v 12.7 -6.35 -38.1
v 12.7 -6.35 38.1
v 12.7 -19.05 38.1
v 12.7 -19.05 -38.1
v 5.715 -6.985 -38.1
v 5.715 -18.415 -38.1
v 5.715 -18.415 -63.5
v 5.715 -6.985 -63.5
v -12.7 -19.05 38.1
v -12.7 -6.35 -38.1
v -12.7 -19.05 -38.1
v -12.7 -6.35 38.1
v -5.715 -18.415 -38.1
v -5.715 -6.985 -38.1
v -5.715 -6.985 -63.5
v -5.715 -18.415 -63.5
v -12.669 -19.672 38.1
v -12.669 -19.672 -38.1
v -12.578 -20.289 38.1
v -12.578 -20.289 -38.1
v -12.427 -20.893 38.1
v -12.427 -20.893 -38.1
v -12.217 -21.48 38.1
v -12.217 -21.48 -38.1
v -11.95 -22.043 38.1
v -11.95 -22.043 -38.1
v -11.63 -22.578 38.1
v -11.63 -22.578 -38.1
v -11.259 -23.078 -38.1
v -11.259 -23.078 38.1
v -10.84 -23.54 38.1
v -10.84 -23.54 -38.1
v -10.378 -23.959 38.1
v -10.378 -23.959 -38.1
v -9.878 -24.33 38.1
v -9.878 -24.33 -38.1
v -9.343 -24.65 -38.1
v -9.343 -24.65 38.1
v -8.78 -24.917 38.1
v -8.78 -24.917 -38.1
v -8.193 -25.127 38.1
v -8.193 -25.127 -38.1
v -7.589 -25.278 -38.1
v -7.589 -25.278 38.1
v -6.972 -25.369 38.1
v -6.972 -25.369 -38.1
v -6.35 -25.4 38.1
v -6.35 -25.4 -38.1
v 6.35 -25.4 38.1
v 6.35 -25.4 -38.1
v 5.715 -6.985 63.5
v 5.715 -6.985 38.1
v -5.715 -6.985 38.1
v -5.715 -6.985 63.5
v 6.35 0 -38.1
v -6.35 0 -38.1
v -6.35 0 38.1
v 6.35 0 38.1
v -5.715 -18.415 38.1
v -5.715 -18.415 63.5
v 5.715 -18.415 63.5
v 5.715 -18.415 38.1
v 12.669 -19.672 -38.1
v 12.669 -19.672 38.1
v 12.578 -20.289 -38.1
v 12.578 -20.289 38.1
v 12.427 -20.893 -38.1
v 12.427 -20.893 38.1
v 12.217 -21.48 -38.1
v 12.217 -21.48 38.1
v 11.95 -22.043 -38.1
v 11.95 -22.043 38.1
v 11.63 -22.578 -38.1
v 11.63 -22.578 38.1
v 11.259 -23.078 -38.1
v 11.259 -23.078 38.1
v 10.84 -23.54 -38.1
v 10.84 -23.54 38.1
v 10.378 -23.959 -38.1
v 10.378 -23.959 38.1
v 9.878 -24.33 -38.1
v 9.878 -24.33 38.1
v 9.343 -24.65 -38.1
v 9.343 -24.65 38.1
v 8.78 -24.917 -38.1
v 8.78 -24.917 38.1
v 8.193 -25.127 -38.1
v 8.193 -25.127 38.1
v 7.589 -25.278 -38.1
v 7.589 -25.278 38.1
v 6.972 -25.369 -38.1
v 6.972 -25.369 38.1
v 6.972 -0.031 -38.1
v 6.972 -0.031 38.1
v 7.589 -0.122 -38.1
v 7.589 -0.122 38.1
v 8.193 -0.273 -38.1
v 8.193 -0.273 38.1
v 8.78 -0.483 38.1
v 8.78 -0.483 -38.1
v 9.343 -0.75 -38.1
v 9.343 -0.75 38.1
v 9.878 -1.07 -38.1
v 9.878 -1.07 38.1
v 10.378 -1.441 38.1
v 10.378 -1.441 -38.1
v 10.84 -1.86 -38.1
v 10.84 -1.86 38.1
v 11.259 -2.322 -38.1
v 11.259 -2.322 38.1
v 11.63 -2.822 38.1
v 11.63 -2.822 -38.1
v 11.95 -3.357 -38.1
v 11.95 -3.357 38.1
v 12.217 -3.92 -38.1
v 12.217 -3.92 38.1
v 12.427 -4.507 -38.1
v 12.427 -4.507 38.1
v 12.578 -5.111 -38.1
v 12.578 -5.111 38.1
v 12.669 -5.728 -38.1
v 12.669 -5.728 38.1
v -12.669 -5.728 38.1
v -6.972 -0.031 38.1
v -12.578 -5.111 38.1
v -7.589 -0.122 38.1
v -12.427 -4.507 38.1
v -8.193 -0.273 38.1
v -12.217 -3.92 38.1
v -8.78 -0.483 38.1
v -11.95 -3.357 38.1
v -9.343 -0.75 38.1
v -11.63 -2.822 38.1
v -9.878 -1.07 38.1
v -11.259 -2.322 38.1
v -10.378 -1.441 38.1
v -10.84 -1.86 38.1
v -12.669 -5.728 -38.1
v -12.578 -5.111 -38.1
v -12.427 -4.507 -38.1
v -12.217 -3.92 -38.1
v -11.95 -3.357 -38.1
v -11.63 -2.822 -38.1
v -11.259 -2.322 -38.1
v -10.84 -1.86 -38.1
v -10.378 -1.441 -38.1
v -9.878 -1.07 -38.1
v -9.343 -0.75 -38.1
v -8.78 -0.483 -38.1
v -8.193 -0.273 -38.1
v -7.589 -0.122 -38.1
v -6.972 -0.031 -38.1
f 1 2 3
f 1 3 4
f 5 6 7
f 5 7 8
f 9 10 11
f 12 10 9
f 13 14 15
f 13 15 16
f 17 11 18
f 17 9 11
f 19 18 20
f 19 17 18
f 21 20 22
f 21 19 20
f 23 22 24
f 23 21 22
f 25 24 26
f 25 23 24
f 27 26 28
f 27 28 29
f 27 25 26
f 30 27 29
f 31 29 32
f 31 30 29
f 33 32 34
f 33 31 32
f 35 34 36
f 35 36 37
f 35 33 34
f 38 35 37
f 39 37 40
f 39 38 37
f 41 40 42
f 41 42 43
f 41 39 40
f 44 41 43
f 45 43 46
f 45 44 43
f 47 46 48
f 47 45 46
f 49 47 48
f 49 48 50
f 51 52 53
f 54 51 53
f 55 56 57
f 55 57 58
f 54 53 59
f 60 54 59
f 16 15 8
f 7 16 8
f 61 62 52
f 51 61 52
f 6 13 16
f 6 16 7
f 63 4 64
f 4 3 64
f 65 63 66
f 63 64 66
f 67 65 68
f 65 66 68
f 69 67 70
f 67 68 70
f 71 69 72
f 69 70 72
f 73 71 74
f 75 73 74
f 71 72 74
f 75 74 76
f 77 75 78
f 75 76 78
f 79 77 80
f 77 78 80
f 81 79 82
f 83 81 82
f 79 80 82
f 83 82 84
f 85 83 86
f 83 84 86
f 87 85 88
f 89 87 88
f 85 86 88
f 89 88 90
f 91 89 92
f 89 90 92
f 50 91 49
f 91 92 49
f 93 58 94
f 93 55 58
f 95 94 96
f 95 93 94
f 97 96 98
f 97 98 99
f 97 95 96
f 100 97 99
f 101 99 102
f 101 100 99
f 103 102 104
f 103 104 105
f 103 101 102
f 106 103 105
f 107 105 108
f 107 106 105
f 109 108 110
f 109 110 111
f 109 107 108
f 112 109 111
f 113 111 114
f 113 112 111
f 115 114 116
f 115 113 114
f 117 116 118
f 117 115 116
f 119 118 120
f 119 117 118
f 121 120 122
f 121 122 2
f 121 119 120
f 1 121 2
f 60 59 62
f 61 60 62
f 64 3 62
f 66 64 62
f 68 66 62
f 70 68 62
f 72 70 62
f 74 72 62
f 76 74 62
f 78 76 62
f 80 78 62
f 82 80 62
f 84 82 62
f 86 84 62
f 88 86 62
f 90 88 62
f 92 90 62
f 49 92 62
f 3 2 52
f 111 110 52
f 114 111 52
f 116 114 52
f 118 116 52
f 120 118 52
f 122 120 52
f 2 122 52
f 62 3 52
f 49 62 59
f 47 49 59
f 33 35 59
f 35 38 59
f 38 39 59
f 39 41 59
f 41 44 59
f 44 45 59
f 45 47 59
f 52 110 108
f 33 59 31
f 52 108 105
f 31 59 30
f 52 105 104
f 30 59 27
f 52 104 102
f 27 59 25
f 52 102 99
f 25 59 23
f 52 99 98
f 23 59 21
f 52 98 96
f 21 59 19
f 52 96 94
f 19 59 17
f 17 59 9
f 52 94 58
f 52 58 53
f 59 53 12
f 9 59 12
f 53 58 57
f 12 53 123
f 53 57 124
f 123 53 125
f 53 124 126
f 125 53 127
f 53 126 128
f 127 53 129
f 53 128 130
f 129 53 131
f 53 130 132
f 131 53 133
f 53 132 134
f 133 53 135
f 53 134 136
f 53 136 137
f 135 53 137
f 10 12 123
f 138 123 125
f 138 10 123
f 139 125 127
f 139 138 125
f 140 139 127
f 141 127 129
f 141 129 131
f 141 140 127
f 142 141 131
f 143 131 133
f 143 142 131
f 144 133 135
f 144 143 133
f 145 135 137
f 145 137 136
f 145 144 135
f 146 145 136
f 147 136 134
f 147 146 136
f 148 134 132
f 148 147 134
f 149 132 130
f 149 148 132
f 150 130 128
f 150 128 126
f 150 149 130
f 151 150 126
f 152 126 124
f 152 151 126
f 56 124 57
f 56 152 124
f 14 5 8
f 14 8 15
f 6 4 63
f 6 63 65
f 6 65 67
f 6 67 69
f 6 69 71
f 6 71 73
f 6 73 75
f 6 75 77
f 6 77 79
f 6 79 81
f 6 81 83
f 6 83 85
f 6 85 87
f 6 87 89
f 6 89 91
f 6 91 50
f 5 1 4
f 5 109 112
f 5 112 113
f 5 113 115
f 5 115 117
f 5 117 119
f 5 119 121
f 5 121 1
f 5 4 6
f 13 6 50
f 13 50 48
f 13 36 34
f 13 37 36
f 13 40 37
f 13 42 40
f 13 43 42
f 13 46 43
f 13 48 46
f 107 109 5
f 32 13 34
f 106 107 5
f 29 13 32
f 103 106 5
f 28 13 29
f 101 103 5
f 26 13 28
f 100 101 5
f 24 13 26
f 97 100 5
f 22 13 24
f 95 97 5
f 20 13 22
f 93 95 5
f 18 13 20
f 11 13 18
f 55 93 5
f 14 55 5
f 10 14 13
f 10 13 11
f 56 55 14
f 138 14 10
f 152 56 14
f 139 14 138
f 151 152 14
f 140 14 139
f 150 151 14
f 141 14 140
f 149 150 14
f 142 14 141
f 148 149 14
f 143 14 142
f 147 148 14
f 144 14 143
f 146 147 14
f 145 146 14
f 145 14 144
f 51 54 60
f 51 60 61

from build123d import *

# Parameters (mm, degrees)
F1_DEPTH = 25.4
F3_DEPTH = 25.4
F5_R     = 6.35


with BuildPart() as f1:
    # F0 (on Front) → F1 (new body)
    with BuildSketch(Plane.XZ):
        Polygon((-12.7, 0), (0, 0), (12.7, 0), (12.7, 38.1), (0, 38.1), (-12.7, 38.1), align=None)
    extrude(amount=F1_DEPTH)

    # F2 (on face) → F3 (join)
    with BuildSketch(Plane.XY.offset(38.1)):
        Polygon((5.715, -6.985), (0, -6.985), (0, -12.7), (0, -18.415), (5.715, -18.415), align=None)
        Polygon((0, -12.7), (0, -6.985), (-5.715, -6.985), (-5.715, -18.415), (0, -18.415), align=None)
    extrude(amount=F3_DEPTH)

    # F4: F1 across plane


with BuildPart() as f1_1:
    add(f1.part)
    add(f1.part.mirror(Plane.XY))

    # F5
    f5_edges = [f1_1.edges().sort_by_distance(p)[0] for p in [
        (12.7, 0, 0),
        (12.7, -25.4, 0),
        (-12.7, 0, 0),
        (-12.7, -25.4, 0),
    ]]
    fillet(f5_edges, radius=F5_R)


solid = f1_1.part
